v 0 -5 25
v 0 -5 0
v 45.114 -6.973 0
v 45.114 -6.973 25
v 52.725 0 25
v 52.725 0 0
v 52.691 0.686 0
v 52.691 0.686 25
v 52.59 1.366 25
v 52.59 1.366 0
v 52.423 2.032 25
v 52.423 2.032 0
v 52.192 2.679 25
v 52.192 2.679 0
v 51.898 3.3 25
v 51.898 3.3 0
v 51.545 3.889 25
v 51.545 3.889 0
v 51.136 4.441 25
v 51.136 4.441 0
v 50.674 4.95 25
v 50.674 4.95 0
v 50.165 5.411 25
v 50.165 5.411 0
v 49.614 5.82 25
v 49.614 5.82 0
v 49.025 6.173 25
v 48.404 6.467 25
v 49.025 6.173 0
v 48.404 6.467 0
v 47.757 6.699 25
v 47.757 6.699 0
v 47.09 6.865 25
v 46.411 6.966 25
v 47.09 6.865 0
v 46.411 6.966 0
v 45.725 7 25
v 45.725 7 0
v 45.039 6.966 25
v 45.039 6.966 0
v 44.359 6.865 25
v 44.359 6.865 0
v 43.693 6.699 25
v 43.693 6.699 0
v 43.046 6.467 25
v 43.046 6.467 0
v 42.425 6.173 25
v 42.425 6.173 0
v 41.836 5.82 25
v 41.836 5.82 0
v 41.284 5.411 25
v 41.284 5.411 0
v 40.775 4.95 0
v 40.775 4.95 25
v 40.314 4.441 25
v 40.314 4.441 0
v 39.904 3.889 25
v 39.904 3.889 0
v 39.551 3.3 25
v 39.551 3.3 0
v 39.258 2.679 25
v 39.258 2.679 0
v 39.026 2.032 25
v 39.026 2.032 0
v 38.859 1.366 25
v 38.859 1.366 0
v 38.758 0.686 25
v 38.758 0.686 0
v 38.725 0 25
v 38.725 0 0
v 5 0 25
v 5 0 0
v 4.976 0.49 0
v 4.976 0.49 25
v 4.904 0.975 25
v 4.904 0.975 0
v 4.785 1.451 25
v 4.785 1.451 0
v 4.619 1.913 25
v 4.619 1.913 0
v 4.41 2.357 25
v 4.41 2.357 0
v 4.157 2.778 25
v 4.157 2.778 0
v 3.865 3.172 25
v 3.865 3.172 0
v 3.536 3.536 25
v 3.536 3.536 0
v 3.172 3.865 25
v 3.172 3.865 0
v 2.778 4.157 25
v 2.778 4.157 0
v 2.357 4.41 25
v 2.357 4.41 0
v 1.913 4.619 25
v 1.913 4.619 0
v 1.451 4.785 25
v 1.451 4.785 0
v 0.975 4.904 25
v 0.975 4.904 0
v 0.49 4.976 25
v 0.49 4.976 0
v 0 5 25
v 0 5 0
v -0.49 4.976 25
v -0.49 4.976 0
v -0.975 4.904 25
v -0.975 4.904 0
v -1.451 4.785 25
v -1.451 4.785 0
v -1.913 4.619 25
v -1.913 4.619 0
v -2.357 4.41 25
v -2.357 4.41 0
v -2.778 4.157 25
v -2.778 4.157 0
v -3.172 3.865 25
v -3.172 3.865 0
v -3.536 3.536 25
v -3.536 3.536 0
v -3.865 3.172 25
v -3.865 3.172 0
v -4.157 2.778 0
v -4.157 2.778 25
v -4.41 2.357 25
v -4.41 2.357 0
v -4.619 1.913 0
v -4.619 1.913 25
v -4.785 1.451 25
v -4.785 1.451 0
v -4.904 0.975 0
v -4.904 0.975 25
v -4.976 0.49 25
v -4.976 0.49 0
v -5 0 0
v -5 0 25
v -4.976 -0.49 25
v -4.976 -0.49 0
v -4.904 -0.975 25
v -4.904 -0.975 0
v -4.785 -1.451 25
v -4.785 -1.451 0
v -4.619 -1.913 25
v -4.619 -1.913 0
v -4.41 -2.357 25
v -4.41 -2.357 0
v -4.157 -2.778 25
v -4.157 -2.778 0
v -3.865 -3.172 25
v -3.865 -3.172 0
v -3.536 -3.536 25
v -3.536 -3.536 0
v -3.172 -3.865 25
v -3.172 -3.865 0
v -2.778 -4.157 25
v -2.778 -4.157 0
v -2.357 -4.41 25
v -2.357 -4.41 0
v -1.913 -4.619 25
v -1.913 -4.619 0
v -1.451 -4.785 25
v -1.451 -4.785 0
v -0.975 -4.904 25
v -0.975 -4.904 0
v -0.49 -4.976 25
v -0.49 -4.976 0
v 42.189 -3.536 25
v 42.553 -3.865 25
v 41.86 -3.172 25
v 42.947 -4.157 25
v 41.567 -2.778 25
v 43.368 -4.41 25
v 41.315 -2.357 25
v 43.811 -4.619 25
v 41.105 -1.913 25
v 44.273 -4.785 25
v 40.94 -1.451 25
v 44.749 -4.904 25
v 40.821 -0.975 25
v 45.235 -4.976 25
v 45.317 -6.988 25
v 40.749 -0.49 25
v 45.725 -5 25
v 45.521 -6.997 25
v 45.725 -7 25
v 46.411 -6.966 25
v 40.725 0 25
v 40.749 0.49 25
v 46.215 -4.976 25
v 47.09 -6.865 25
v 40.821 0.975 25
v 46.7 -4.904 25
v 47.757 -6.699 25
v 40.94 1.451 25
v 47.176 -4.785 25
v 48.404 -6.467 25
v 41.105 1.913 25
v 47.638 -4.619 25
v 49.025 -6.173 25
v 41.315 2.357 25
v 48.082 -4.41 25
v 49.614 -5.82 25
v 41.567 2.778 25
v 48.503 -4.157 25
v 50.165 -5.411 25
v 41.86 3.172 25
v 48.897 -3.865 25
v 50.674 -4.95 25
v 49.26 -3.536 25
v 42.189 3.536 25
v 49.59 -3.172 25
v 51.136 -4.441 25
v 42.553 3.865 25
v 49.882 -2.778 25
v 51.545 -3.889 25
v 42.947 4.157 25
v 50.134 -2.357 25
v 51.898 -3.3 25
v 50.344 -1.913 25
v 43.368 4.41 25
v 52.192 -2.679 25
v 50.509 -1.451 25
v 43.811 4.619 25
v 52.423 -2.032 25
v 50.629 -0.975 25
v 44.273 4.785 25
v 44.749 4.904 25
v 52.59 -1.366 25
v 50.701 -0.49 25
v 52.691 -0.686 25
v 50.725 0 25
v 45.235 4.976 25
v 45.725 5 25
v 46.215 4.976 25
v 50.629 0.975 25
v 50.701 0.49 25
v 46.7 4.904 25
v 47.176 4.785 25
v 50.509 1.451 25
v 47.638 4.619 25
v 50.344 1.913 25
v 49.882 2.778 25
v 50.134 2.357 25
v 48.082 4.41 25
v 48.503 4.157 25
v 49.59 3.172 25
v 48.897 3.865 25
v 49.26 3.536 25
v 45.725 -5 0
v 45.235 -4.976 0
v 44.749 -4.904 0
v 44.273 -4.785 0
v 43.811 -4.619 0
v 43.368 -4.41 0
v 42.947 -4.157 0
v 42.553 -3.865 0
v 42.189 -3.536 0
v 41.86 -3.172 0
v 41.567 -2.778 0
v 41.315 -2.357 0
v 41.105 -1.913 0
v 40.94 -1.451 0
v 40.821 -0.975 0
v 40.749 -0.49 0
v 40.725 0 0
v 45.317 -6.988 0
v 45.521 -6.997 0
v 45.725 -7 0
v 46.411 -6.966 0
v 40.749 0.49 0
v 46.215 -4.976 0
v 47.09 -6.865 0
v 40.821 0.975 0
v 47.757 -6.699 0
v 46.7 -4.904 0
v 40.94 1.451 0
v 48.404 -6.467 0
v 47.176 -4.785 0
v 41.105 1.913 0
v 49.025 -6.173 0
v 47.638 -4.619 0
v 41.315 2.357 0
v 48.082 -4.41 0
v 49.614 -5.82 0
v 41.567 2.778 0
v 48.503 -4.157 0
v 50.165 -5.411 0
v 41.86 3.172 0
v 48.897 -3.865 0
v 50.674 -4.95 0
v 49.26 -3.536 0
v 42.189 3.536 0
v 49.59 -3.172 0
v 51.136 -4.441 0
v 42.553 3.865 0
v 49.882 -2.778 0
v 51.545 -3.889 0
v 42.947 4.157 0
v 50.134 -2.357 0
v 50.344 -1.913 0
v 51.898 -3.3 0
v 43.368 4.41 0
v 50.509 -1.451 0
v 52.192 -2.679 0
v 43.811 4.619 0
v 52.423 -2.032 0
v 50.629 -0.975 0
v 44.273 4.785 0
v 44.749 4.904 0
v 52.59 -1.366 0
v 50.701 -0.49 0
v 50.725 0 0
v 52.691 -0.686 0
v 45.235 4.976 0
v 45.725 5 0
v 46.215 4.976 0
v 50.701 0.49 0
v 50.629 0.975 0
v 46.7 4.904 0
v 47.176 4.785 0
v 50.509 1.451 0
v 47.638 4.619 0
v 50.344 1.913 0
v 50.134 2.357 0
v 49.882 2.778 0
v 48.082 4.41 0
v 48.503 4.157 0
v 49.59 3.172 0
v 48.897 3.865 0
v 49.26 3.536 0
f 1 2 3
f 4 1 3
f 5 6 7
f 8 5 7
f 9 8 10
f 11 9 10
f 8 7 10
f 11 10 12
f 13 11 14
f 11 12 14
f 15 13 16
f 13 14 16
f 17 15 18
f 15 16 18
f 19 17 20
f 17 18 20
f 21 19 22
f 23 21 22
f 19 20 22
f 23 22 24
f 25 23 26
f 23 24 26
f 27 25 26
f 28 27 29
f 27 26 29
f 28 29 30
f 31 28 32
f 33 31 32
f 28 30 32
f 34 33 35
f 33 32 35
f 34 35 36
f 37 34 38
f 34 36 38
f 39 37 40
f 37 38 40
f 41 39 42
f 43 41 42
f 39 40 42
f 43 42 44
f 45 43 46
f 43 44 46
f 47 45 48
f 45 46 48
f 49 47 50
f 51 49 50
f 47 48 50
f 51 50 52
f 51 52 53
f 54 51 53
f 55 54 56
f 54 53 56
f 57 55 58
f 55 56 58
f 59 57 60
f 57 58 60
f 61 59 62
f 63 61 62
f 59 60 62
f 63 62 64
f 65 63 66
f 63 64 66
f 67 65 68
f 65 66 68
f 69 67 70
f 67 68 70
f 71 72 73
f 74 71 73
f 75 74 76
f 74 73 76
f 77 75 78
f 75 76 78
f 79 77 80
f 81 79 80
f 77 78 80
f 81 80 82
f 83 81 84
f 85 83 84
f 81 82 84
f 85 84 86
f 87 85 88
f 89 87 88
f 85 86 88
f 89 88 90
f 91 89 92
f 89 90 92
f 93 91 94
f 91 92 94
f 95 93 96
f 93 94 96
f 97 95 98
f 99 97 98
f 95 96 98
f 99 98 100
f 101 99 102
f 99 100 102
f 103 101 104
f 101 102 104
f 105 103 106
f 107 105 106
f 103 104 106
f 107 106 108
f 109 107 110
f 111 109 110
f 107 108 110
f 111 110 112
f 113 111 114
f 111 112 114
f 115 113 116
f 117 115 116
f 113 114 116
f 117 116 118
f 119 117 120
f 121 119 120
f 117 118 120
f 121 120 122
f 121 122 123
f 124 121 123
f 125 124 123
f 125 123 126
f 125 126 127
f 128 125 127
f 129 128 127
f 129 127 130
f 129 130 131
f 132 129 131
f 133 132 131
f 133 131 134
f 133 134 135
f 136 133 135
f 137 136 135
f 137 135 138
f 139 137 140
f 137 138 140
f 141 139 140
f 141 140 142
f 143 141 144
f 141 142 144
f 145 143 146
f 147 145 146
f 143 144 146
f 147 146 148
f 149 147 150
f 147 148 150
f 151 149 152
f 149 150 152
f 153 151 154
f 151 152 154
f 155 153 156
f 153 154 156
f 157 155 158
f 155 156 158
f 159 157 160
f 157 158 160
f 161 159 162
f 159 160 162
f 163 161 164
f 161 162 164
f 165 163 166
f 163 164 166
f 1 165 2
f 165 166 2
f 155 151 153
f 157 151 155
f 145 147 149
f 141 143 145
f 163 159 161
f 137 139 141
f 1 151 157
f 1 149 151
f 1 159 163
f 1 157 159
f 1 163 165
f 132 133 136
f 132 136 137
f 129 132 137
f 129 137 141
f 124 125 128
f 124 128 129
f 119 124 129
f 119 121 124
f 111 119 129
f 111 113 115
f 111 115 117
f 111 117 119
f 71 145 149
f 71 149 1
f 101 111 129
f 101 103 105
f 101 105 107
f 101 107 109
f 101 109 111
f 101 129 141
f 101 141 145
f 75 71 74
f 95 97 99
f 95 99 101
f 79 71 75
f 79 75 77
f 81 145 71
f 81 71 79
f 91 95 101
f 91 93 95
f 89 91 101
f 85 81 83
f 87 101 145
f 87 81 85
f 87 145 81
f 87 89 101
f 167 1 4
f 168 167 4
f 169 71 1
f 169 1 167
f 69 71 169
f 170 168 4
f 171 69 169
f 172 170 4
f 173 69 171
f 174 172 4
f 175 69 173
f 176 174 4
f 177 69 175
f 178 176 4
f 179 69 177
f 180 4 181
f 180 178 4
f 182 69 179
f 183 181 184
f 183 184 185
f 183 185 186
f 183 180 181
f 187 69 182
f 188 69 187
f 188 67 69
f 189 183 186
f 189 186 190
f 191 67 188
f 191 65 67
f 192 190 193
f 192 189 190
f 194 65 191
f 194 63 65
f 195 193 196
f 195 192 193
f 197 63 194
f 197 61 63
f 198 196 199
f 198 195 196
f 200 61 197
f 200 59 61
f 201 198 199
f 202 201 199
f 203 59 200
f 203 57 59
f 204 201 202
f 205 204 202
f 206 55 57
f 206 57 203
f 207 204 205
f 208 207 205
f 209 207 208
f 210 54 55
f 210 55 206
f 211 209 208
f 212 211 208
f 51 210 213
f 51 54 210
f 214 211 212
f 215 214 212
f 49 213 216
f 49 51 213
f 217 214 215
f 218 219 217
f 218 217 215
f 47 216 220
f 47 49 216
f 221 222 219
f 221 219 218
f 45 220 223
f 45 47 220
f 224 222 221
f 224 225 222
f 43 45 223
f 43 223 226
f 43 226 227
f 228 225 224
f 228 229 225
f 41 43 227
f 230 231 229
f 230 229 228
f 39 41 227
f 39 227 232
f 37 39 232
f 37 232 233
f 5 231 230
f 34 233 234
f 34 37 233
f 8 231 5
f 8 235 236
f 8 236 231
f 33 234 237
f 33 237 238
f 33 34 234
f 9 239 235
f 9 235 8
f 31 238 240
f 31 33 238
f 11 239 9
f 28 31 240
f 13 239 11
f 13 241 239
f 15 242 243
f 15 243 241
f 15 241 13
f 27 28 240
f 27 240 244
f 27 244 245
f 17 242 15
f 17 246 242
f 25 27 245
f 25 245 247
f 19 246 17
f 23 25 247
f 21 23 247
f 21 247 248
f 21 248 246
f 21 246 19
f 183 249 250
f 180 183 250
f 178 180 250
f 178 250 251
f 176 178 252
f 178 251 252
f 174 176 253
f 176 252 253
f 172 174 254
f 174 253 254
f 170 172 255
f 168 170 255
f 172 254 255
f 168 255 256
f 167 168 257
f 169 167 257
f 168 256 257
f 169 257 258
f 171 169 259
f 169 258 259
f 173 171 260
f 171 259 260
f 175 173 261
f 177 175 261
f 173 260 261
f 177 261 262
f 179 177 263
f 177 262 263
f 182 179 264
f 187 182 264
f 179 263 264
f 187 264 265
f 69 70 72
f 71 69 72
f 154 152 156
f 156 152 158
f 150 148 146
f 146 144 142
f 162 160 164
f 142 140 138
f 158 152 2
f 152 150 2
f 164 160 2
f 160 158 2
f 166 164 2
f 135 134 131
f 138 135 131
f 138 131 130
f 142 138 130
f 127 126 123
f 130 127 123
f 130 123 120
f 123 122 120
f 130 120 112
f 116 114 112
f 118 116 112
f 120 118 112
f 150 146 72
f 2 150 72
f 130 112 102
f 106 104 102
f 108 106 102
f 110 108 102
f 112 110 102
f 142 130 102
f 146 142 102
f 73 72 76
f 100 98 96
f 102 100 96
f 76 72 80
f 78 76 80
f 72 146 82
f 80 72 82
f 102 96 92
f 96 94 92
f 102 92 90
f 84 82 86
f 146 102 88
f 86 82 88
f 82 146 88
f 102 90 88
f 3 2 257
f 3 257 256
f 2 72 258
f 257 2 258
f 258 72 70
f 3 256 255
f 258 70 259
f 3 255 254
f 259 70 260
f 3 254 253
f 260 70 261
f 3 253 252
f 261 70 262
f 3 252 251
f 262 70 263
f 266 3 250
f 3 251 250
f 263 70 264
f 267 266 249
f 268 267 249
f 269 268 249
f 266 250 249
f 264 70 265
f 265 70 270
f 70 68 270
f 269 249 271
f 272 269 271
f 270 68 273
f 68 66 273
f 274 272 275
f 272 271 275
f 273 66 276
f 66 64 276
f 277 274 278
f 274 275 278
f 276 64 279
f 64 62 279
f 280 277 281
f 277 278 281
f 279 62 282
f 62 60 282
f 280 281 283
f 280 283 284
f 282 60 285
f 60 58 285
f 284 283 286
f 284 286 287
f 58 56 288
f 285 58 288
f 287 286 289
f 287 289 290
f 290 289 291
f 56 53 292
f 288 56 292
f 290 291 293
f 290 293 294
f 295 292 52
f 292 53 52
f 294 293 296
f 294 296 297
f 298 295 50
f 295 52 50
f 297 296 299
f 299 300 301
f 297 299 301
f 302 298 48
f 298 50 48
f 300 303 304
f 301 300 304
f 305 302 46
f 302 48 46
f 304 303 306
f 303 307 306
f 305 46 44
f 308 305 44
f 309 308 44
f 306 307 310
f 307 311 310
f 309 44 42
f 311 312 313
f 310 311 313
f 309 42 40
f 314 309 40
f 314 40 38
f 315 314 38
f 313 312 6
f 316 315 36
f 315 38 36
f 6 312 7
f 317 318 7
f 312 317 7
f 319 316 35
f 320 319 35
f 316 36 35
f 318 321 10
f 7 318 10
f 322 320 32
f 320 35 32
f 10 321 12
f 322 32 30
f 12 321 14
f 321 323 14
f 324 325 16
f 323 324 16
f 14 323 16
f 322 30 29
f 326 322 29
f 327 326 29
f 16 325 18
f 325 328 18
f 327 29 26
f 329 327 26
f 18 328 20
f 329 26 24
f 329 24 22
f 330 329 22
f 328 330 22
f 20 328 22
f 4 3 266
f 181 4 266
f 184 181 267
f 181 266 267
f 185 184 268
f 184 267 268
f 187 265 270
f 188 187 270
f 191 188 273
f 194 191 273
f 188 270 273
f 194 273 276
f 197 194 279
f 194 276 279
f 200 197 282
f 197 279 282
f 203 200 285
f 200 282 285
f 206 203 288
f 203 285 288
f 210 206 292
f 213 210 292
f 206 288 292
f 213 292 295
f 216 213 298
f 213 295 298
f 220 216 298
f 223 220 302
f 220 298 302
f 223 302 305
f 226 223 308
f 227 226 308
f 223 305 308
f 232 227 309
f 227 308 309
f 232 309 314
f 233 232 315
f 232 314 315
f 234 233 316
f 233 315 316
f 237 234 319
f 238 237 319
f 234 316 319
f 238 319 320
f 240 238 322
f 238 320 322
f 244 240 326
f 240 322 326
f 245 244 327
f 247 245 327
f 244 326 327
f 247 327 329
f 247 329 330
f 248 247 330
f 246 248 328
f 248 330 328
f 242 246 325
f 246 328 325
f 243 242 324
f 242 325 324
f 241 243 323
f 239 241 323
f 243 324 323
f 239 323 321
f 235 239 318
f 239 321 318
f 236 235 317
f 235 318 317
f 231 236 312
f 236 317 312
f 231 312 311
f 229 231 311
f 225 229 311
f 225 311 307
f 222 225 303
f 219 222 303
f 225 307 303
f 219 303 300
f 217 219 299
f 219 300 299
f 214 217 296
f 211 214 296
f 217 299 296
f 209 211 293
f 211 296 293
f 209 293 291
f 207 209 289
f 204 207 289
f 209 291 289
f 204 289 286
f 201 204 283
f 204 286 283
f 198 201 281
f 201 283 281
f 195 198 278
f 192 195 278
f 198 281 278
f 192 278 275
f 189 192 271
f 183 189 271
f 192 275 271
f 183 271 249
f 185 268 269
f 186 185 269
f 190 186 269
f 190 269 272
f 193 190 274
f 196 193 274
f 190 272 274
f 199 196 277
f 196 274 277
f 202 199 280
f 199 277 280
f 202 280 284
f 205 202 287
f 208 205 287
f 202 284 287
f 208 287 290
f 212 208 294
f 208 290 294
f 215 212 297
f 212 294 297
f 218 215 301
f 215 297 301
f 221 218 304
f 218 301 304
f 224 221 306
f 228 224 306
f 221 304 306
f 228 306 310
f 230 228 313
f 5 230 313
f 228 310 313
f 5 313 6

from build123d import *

# Parameters (mm, degrees)
F1_DEPTH = 25


with BuildPart() as f1:
    # F0 (on Top) → F1 (new body)
    with BuildSketch(Plane.XY):
        with BuildLine():
            ThreePointArc((52.7247383893, 0), (45.7247383893, 7), (38.7247383893, 0))
            Line((38.7247383893, 0), (40.7247383893, 0))
            ThreePointArc((40.7247383893, 0), (45.7247383893, 5), (50.7247383893, 0))
            ThreePointArc((50.7247383893, 0), (49.2602722952, -3.5355339059), (45.7247383893, -5))
            Line((45.7247383893, -5), (45.7247383893, -7))
            ThreePointArc((45.7247383893, -7), (50.6744858576, -4.9497474683), (52.7247383893, 0))
        make_face()
        with BuildLine():
            ThreePointArc((0, -5), (3.5355339059, -3.5355339059), (5, 0))
            ThreePointArc((5, 0), (-3.5355339059, 3.5355339059), (0, -5))
        make_face()
        with BuildLine():
            Line((22.8623691946, 0), (5, 0))
            ThreePointArc((5, 0), (3.5355339059, -3.5355339059), (0, -5))
            Line((0, -5), (45.1135477291, -6.9732665213))
            ThreePointArc((45.1135477291, -6.9732665213), (40.5634238948, -4.7287242137), (38.7247383893, 0))
            Line((38.7247383893, 0), (22.8623691946, 0))
        make_face()
        with BuildLine():
            Line((45.7247383893, -7), (45.1135477291, -6.9732665213))
            ThreePointArc((45.1135477291, -6.9732665213), (45.4188508683, -6.9933134367), (45.7247383893, -7))
        make_face()
        with BuildLine():
            ThreePointArc((38.7247383893, 0), (40.5634238948, -4.7287242137), (45.1135477291, -6.9732665213))
            Line((45.1135477291, -6.9732665213), (45.7247383893, -7))
            Line((45.7247383893, -7), (45.7247383893, -5))
            ThreePointArc((45.7247383893, -5), (42.1892044833, -3.5355339059), (40.7247383893, 0))
            Line((40.7247383893, 0), (38.7247383893, 0))
        make_face()
    extrude(amount=F1_DEPTH)


solid = f1.part
